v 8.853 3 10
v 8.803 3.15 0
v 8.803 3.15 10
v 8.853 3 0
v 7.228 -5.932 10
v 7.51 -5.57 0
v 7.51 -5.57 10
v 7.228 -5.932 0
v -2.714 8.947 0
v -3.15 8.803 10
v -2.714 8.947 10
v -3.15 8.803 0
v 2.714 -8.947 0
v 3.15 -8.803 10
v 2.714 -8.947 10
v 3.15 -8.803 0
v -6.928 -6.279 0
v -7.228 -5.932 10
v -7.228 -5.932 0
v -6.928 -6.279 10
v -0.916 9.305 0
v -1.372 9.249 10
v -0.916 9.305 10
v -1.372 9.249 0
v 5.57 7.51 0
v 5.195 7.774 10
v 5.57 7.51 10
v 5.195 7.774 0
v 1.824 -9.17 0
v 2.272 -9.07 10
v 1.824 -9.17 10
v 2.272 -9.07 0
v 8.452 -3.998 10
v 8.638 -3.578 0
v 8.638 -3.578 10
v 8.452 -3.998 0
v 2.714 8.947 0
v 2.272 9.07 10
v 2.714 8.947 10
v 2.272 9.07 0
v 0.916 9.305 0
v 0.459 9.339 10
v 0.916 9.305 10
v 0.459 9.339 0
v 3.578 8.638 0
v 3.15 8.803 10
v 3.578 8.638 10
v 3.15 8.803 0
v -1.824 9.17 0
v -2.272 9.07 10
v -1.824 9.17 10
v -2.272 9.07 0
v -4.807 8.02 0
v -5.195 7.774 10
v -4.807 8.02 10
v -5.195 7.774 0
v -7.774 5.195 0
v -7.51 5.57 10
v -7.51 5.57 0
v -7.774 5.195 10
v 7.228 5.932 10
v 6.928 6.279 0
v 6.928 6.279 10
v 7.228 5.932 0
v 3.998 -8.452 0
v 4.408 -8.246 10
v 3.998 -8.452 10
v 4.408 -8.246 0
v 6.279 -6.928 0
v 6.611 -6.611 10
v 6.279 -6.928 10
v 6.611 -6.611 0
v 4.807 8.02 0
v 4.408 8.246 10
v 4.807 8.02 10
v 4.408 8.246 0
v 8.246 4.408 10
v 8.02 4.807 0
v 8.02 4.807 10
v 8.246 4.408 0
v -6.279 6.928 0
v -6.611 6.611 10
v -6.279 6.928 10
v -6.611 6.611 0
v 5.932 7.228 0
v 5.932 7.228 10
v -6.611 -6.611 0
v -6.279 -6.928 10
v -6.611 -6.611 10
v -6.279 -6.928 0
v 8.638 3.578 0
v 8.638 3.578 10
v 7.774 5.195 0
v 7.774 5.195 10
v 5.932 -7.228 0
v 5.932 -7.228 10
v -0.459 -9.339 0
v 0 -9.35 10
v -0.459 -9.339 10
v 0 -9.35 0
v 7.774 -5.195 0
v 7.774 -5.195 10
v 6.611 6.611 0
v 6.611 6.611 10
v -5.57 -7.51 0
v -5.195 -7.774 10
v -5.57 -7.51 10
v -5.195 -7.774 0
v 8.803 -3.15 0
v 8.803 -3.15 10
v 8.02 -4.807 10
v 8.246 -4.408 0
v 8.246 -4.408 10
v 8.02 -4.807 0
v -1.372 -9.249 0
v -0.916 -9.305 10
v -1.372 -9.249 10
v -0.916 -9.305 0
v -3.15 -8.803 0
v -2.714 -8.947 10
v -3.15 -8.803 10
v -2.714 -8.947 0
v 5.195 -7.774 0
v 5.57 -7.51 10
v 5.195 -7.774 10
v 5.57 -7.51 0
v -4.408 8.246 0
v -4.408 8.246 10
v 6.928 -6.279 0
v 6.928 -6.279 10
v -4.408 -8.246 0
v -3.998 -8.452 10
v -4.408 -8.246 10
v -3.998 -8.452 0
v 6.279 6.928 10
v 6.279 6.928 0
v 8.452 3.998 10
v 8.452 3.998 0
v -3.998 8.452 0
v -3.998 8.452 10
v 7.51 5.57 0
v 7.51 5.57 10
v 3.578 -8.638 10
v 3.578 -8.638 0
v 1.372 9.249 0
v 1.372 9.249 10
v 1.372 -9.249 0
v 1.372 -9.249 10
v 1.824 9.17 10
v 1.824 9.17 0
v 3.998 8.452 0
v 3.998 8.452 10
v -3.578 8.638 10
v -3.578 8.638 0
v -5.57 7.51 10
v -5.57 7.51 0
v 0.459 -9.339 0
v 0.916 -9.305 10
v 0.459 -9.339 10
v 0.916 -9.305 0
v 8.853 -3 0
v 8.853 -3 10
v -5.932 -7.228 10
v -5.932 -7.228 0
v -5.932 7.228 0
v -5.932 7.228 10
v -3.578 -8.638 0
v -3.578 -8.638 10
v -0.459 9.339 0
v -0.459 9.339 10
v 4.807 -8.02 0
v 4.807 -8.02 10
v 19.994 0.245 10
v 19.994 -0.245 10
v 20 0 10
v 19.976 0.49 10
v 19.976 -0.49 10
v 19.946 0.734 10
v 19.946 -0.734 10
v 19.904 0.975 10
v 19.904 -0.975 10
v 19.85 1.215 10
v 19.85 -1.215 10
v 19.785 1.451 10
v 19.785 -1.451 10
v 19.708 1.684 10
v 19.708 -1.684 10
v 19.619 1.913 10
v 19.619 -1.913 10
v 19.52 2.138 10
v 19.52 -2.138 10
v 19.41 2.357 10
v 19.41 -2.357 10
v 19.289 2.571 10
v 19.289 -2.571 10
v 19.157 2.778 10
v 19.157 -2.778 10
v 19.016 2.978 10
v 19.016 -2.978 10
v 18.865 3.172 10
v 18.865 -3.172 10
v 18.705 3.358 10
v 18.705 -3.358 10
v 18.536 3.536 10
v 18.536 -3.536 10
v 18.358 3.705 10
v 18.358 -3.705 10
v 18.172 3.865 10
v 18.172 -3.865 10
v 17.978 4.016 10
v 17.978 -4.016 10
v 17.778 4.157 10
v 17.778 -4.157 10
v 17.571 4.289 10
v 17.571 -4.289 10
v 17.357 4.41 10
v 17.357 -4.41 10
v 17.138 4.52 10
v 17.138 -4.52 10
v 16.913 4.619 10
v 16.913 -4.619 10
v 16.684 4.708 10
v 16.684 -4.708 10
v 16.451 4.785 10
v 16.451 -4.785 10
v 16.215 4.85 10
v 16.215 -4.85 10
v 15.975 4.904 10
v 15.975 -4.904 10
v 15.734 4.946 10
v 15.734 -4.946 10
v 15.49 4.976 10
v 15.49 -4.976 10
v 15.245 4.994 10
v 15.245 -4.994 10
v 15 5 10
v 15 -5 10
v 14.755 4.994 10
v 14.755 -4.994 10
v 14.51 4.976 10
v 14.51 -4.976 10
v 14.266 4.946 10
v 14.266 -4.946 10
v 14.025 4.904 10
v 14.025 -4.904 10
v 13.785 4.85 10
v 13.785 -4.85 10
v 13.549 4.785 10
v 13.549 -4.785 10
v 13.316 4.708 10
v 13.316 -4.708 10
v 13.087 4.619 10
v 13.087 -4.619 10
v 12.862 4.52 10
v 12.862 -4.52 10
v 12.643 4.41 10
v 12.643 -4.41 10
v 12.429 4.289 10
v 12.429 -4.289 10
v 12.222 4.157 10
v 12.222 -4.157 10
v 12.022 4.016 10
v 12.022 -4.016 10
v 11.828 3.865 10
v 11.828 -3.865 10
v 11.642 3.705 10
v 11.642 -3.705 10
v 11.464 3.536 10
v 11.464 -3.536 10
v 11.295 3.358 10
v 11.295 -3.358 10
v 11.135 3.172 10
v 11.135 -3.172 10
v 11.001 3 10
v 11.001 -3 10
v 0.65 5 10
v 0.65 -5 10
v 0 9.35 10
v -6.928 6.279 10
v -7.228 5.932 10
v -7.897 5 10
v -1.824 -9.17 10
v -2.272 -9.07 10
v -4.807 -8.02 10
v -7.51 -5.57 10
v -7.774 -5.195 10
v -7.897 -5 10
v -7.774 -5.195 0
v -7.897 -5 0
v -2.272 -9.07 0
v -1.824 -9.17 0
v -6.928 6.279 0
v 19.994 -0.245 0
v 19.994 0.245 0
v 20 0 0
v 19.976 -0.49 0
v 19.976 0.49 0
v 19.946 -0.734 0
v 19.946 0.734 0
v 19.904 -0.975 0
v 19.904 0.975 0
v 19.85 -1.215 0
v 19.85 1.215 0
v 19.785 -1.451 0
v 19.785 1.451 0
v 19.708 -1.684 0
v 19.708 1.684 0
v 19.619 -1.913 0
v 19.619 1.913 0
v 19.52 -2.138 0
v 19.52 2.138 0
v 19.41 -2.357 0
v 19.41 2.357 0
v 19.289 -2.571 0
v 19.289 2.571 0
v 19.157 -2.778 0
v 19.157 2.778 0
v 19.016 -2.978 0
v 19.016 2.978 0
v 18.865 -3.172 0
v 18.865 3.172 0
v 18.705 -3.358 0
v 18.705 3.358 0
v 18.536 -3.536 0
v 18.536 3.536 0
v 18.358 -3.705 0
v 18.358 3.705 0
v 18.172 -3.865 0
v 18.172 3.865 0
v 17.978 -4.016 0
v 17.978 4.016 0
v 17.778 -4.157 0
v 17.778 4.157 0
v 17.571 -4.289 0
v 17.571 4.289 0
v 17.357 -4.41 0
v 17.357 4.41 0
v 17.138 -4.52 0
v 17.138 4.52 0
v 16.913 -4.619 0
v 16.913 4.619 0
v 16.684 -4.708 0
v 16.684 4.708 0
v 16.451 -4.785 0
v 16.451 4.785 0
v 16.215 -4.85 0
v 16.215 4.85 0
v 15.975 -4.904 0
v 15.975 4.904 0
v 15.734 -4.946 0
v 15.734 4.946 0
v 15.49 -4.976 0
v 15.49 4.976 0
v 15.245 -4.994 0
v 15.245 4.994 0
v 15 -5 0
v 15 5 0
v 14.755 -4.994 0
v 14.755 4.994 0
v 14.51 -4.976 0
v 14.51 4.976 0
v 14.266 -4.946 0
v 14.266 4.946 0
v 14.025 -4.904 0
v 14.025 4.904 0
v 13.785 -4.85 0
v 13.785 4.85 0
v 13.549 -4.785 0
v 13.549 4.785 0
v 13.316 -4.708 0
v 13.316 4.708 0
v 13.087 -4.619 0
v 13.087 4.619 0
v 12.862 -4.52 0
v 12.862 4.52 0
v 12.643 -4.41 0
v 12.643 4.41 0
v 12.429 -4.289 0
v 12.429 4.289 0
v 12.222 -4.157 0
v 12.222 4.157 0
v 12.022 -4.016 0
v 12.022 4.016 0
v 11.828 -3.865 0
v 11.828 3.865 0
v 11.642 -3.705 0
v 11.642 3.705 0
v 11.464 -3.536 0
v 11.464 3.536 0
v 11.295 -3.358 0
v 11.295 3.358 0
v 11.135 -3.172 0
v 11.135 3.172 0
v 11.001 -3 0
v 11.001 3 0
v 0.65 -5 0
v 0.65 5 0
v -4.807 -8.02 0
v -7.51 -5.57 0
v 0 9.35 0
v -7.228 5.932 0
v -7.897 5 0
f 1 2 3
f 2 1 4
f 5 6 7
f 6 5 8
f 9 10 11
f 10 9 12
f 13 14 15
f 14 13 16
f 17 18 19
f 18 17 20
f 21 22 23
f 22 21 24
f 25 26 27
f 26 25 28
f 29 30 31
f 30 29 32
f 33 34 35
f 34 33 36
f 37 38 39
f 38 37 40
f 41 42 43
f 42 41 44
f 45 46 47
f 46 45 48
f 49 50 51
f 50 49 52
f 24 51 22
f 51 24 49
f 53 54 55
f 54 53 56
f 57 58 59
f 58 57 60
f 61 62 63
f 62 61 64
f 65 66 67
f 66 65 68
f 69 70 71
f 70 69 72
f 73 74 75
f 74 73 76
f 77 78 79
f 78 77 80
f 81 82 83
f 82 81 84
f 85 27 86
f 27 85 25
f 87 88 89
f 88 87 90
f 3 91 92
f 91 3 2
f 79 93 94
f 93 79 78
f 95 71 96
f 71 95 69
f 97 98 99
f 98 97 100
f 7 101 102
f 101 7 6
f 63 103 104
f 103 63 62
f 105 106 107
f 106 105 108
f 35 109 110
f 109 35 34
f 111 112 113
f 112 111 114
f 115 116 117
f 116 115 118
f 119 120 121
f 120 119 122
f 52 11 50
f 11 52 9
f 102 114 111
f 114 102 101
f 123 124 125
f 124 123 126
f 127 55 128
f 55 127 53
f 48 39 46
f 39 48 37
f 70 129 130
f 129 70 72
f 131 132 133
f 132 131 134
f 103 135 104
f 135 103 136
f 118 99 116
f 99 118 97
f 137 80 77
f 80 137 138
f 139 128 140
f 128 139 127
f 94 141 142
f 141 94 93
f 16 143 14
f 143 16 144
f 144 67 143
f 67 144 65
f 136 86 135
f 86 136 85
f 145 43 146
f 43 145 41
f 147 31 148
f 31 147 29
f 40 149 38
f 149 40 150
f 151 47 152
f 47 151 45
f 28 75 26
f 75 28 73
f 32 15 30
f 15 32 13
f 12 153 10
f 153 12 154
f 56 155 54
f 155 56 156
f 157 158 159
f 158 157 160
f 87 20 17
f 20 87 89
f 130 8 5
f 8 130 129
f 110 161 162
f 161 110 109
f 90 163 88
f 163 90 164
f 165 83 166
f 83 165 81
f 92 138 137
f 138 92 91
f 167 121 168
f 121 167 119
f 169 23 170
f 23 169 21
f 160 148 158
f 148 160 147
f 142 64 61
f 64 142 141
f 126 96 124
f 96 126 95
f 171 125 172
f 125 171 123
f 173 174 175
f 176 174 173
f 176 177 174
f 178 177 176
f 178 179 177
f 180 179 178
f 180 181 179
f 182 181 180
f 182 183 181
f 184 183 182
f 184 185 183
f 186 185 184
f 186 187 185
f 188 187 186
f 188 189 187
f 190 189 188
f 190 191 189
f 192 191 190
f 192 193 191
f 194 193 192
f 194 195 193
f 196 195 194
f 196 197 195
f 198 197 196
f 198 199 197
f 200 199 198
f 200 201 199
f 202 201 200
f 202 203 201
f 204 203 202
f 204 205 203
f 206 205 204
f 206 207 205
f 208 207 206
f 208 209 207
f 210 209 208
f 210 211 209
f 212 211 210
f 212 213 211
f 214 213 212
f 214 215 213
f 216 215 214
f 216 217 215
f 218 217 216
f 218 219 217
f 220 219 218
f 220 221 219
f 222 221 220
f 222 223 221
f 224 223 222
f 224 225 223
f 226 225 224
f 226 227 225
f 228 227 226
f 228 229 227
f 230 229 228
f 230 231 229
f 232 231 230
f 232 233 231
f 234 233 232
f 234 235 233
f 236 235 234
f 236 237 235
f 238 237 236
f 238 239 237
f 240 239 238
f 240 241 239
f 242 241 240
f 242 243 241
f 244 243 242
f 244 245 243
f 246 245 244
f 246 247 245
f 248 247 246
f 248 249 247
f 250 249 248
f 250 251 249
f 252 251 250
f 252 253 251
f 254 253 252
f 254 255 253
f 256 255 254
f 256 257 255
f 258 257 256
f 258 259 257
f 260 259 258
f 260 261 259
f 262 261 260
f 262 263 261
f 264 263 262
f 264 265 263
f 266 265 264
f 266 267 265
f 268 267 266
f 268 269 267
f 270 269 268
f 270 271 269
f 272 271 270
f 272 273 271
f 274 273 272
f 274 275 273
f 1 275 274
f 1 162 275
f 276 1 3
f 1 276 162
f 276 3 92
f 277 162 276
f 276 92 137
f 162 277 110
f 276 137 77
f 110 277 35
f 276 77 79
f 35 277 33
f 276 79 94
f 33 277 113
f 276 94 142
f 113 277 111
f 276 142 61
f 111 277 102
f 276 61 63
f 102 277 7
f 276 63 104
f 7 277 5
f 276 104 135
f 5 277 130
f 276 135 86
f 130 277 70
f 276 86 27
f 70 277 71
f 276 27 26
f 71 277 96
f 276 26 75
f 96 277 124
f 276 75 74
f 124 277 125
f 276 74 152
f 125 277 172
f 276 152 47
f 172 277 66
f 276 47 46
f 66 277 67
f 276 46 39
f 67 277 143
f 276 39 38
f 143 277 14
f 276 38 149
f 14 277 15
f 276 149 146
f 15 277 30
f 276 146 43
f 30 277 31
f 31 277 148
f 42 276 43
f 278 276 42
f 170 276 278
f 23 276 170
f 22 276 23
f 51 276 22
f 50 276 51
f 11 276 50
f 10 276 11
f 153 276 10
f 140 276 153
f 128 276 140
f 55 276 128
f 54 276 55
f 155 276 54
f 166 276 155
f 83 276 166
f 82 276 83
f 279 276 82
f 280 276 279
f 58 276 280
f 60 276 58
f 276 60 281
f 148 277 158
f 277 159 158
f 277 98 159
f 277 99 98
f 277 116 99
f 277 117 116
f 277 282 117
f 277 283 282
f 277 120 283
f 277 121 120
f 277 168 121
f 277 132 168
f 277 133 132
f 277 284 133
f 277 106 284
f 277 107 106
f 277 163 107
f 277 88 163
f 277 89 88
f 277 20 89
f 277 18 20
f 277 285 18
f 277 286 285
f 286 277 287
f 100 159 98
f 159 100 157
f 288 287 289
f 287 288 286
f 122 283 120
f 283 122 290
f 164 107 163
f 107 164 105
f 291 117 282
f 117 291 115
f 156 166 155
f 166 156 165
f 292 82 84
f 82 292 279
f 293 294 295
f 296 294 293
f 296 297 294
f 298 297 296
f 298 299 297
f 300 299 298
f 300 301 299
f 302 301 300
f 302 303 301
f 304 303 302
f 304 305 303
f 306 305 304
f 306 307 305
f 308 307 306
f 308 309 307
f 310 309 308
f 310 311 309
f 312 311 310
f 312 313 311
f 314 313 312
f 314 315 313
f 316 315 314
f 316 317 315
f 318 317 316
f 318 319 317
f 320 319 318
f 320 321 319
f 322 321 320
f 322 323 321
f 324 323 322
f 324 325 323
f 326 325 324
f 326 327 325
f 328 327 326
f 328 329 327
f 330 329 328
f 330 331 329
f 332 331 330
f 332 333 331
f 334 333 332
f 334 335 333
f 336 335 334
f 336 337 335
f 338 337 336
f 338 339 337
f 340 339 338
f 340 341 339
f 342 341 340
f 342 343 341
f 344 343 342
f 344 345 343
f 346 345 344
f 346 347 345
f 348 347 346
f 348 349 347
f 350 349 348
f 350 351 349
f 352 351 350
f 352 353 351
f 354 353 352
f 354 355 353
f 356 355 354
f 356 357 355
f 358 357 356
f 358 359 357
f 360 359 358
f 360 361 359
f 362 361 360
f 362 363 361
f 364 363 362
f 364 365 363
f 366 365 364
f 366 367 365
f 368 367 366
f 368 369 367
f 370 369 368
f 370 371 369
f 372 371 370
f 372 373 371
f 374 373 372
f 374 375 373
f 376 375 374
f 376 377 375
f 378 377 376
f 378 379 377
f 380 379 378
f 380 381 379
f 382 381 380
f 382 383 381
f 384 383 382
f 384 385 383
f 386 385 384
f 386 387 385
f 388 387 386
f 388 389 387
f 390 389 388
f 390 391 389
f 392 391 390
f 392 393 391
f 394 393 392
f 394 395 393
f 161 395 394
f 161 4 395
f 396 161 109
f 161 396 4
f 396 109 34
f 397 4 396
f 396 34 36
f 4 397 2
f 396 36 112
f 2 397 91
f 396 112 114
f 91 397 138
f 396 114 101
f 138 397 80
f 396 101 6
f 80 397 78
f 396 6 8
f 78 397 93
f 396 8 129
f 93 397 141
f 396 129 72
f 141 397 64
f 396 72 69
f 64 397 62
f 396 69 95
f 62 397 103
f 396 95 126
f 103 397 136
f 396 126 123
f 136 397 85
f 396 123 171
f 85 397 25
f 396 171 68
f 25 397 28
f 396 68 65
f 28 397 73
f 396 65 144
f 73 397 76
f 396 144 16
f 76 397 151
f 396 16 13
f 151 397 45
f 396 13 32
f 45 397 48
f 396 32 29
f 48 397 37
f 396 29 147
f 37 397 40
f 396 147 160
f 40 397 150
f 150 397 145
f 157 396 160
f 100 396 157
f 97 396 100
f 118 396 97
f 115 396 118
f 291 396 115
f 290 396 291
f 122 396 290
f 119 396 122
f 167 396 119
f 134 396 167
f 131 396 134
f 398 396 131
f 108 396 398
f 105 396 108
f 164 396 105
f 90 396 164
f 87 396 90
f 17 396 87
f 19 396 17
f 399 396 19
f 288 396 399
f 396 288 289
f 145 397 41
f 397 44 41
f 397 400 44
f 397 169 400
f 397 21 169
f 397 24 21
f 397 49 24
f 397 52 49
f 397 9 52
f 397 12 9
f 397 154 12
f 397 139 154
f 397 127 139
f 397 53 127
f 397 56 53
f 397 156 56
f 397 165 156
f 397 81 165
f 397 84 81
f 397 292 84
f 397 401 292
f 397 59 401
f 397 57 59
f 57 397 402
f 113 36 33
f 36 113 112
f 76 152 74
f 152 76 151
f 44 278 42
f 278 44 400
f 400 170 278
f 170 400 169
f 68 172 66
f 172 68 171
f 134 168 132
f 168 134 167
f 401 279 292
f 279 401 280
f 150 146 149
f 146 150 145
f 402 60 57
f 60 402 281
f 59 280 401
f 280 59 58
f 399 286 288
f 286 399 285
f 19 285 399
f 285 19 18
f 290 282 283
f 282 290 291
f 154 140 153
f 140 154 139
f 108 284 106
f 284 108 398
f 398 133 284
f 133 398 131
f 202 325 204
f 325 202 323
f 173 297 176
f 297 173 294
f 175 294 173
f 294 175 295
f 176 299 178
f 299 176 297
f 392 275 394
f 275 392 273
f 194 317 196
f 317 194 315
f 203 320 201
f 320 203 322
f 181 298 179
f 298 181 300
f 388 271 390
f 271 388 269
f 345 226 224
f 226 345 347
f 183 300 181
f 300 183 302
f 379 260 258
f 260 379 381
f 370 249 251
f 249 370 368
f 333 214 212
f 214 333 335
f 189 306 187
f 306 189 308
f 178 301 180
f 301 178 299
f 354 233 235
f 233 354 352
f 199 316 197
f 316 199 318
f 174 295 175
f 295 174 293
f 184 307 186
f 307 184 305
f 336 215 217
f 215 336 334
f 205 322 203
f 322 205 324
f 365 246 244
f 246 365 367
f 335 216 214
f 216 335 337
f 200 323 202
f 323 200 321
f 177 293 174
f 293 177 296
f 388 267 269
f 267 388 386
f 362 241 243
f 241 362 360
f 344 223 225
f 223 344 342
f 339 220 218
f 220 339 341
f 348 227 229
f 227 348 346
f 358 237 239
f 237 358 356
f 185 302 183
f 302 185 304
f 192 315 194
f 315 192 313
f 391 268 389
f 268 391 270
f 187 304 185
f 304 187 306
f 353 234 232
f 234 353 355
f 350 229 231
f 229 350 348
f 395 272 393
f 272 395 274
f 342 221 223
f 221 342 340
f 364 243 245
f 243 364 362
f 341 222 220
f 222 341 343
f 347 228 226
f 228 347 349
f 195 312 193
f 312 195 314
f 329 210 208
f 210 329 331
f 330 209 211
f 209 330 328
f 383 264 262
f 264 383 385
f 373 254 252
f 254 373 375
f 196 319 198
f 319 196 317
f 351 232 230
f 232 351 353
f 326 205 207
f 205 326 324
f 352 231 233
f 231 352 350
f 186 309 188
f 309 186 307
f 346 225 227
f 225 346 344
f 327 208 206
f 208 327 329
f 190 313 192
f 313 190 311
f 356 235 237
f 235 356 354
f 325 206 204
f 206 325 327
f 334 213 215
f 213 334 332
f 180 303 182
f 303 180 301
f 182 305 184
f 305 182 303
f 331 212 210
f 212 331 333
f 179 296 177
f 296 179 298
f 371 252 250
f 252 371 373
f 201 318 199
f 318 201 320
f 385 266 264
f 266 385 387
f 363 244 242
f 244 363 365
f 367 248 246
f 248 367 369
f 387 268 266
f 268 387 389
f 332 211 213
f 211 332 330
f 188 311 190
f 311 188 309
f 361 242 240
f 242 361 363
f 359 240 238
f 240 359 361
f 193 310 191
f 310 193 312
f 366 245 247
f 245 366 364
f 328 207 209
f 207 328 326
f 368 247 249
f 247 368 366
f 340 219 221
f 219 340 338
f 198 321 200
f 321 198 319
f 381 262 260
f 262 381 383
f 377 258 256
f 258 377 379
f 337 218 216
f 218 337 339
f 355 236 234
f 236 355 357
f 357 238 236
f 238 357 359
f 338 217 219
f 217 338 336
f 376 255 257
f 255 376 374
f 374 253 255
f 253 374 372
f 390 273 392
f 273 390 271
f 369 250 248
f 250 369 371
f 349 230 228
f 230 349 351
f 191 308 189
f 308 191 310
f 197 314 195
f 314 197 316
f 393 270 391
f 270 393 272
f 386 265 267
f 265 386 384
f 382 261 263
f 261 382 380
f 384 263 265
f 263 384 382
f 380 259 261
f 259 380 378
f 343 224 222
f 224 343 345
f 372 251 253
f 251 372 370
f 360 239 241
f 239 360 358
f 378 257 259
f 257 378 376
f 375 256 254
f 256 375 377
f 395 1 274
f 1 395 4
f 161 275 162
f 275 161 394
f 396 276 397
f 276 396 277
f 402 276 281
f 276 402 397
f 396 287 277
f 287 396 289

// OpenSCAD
// Tubing and stand-rod snap-on clip
// Print orientation: flat on bed, z = 0 up to z = 10

// ---- Stand rod ----
stand_d  = 12.7;   // stand rod diameter
stand_t  = 3;      // stand ring wall thickness
stand_r  = stand_d / 2 + stand_t;  // stand ring outer radius = 18.7

// ---- Tubing ----
tube_d   = 6;      // tubing inner diameter
tube_w   = 2;      // tubing wall thickness
tube_i   = tube_d / 2 + tube_w;   // tubing outer radius = 5
tube_x   = 15;     // tubing ring centre X

// ---- Opening ----
open_w   = 10;     // stand ring opening width (X)
open_y   = 5;      // stand ring opening half-height (Y)

// ---- Bridge ----
bridge_w = 6;      // bridge width (Y)
bridge_x0 = 8;     // bridge start (X)
bridge_x1 = 12;    // bridge end (X)

// ---- Misc ----
eps = 0.5;         // cutter overshoot past faces
$fn = 128;         // curve resolution

difference() {
    union() {
        // Stand ring
        cylinder(r = stand_r, h = 10);
        // Tubing ring
        translate([tube_x, 0, 0])
            cylinder(r = tube_i, h = 10);
        // Solid bridge
        translate([bridge_x0, -bridge_w / 2, 0])
            cube([bridge_x1 - bridge_x0, bridge_w, 10]);
    }
    // Stand ring opening, cut through full Z
    translate([-stand_r, -open_y, -eps])
        cube([open_w, 2 * open_y, 10 + 2 * eps]);
    // Tubing ring opening, cut through full Z
    translate([tube_x + tube_i, -open_y / 2, -eps])
        cube([open_w, open_y, 10 + 2 * eps]);
}
